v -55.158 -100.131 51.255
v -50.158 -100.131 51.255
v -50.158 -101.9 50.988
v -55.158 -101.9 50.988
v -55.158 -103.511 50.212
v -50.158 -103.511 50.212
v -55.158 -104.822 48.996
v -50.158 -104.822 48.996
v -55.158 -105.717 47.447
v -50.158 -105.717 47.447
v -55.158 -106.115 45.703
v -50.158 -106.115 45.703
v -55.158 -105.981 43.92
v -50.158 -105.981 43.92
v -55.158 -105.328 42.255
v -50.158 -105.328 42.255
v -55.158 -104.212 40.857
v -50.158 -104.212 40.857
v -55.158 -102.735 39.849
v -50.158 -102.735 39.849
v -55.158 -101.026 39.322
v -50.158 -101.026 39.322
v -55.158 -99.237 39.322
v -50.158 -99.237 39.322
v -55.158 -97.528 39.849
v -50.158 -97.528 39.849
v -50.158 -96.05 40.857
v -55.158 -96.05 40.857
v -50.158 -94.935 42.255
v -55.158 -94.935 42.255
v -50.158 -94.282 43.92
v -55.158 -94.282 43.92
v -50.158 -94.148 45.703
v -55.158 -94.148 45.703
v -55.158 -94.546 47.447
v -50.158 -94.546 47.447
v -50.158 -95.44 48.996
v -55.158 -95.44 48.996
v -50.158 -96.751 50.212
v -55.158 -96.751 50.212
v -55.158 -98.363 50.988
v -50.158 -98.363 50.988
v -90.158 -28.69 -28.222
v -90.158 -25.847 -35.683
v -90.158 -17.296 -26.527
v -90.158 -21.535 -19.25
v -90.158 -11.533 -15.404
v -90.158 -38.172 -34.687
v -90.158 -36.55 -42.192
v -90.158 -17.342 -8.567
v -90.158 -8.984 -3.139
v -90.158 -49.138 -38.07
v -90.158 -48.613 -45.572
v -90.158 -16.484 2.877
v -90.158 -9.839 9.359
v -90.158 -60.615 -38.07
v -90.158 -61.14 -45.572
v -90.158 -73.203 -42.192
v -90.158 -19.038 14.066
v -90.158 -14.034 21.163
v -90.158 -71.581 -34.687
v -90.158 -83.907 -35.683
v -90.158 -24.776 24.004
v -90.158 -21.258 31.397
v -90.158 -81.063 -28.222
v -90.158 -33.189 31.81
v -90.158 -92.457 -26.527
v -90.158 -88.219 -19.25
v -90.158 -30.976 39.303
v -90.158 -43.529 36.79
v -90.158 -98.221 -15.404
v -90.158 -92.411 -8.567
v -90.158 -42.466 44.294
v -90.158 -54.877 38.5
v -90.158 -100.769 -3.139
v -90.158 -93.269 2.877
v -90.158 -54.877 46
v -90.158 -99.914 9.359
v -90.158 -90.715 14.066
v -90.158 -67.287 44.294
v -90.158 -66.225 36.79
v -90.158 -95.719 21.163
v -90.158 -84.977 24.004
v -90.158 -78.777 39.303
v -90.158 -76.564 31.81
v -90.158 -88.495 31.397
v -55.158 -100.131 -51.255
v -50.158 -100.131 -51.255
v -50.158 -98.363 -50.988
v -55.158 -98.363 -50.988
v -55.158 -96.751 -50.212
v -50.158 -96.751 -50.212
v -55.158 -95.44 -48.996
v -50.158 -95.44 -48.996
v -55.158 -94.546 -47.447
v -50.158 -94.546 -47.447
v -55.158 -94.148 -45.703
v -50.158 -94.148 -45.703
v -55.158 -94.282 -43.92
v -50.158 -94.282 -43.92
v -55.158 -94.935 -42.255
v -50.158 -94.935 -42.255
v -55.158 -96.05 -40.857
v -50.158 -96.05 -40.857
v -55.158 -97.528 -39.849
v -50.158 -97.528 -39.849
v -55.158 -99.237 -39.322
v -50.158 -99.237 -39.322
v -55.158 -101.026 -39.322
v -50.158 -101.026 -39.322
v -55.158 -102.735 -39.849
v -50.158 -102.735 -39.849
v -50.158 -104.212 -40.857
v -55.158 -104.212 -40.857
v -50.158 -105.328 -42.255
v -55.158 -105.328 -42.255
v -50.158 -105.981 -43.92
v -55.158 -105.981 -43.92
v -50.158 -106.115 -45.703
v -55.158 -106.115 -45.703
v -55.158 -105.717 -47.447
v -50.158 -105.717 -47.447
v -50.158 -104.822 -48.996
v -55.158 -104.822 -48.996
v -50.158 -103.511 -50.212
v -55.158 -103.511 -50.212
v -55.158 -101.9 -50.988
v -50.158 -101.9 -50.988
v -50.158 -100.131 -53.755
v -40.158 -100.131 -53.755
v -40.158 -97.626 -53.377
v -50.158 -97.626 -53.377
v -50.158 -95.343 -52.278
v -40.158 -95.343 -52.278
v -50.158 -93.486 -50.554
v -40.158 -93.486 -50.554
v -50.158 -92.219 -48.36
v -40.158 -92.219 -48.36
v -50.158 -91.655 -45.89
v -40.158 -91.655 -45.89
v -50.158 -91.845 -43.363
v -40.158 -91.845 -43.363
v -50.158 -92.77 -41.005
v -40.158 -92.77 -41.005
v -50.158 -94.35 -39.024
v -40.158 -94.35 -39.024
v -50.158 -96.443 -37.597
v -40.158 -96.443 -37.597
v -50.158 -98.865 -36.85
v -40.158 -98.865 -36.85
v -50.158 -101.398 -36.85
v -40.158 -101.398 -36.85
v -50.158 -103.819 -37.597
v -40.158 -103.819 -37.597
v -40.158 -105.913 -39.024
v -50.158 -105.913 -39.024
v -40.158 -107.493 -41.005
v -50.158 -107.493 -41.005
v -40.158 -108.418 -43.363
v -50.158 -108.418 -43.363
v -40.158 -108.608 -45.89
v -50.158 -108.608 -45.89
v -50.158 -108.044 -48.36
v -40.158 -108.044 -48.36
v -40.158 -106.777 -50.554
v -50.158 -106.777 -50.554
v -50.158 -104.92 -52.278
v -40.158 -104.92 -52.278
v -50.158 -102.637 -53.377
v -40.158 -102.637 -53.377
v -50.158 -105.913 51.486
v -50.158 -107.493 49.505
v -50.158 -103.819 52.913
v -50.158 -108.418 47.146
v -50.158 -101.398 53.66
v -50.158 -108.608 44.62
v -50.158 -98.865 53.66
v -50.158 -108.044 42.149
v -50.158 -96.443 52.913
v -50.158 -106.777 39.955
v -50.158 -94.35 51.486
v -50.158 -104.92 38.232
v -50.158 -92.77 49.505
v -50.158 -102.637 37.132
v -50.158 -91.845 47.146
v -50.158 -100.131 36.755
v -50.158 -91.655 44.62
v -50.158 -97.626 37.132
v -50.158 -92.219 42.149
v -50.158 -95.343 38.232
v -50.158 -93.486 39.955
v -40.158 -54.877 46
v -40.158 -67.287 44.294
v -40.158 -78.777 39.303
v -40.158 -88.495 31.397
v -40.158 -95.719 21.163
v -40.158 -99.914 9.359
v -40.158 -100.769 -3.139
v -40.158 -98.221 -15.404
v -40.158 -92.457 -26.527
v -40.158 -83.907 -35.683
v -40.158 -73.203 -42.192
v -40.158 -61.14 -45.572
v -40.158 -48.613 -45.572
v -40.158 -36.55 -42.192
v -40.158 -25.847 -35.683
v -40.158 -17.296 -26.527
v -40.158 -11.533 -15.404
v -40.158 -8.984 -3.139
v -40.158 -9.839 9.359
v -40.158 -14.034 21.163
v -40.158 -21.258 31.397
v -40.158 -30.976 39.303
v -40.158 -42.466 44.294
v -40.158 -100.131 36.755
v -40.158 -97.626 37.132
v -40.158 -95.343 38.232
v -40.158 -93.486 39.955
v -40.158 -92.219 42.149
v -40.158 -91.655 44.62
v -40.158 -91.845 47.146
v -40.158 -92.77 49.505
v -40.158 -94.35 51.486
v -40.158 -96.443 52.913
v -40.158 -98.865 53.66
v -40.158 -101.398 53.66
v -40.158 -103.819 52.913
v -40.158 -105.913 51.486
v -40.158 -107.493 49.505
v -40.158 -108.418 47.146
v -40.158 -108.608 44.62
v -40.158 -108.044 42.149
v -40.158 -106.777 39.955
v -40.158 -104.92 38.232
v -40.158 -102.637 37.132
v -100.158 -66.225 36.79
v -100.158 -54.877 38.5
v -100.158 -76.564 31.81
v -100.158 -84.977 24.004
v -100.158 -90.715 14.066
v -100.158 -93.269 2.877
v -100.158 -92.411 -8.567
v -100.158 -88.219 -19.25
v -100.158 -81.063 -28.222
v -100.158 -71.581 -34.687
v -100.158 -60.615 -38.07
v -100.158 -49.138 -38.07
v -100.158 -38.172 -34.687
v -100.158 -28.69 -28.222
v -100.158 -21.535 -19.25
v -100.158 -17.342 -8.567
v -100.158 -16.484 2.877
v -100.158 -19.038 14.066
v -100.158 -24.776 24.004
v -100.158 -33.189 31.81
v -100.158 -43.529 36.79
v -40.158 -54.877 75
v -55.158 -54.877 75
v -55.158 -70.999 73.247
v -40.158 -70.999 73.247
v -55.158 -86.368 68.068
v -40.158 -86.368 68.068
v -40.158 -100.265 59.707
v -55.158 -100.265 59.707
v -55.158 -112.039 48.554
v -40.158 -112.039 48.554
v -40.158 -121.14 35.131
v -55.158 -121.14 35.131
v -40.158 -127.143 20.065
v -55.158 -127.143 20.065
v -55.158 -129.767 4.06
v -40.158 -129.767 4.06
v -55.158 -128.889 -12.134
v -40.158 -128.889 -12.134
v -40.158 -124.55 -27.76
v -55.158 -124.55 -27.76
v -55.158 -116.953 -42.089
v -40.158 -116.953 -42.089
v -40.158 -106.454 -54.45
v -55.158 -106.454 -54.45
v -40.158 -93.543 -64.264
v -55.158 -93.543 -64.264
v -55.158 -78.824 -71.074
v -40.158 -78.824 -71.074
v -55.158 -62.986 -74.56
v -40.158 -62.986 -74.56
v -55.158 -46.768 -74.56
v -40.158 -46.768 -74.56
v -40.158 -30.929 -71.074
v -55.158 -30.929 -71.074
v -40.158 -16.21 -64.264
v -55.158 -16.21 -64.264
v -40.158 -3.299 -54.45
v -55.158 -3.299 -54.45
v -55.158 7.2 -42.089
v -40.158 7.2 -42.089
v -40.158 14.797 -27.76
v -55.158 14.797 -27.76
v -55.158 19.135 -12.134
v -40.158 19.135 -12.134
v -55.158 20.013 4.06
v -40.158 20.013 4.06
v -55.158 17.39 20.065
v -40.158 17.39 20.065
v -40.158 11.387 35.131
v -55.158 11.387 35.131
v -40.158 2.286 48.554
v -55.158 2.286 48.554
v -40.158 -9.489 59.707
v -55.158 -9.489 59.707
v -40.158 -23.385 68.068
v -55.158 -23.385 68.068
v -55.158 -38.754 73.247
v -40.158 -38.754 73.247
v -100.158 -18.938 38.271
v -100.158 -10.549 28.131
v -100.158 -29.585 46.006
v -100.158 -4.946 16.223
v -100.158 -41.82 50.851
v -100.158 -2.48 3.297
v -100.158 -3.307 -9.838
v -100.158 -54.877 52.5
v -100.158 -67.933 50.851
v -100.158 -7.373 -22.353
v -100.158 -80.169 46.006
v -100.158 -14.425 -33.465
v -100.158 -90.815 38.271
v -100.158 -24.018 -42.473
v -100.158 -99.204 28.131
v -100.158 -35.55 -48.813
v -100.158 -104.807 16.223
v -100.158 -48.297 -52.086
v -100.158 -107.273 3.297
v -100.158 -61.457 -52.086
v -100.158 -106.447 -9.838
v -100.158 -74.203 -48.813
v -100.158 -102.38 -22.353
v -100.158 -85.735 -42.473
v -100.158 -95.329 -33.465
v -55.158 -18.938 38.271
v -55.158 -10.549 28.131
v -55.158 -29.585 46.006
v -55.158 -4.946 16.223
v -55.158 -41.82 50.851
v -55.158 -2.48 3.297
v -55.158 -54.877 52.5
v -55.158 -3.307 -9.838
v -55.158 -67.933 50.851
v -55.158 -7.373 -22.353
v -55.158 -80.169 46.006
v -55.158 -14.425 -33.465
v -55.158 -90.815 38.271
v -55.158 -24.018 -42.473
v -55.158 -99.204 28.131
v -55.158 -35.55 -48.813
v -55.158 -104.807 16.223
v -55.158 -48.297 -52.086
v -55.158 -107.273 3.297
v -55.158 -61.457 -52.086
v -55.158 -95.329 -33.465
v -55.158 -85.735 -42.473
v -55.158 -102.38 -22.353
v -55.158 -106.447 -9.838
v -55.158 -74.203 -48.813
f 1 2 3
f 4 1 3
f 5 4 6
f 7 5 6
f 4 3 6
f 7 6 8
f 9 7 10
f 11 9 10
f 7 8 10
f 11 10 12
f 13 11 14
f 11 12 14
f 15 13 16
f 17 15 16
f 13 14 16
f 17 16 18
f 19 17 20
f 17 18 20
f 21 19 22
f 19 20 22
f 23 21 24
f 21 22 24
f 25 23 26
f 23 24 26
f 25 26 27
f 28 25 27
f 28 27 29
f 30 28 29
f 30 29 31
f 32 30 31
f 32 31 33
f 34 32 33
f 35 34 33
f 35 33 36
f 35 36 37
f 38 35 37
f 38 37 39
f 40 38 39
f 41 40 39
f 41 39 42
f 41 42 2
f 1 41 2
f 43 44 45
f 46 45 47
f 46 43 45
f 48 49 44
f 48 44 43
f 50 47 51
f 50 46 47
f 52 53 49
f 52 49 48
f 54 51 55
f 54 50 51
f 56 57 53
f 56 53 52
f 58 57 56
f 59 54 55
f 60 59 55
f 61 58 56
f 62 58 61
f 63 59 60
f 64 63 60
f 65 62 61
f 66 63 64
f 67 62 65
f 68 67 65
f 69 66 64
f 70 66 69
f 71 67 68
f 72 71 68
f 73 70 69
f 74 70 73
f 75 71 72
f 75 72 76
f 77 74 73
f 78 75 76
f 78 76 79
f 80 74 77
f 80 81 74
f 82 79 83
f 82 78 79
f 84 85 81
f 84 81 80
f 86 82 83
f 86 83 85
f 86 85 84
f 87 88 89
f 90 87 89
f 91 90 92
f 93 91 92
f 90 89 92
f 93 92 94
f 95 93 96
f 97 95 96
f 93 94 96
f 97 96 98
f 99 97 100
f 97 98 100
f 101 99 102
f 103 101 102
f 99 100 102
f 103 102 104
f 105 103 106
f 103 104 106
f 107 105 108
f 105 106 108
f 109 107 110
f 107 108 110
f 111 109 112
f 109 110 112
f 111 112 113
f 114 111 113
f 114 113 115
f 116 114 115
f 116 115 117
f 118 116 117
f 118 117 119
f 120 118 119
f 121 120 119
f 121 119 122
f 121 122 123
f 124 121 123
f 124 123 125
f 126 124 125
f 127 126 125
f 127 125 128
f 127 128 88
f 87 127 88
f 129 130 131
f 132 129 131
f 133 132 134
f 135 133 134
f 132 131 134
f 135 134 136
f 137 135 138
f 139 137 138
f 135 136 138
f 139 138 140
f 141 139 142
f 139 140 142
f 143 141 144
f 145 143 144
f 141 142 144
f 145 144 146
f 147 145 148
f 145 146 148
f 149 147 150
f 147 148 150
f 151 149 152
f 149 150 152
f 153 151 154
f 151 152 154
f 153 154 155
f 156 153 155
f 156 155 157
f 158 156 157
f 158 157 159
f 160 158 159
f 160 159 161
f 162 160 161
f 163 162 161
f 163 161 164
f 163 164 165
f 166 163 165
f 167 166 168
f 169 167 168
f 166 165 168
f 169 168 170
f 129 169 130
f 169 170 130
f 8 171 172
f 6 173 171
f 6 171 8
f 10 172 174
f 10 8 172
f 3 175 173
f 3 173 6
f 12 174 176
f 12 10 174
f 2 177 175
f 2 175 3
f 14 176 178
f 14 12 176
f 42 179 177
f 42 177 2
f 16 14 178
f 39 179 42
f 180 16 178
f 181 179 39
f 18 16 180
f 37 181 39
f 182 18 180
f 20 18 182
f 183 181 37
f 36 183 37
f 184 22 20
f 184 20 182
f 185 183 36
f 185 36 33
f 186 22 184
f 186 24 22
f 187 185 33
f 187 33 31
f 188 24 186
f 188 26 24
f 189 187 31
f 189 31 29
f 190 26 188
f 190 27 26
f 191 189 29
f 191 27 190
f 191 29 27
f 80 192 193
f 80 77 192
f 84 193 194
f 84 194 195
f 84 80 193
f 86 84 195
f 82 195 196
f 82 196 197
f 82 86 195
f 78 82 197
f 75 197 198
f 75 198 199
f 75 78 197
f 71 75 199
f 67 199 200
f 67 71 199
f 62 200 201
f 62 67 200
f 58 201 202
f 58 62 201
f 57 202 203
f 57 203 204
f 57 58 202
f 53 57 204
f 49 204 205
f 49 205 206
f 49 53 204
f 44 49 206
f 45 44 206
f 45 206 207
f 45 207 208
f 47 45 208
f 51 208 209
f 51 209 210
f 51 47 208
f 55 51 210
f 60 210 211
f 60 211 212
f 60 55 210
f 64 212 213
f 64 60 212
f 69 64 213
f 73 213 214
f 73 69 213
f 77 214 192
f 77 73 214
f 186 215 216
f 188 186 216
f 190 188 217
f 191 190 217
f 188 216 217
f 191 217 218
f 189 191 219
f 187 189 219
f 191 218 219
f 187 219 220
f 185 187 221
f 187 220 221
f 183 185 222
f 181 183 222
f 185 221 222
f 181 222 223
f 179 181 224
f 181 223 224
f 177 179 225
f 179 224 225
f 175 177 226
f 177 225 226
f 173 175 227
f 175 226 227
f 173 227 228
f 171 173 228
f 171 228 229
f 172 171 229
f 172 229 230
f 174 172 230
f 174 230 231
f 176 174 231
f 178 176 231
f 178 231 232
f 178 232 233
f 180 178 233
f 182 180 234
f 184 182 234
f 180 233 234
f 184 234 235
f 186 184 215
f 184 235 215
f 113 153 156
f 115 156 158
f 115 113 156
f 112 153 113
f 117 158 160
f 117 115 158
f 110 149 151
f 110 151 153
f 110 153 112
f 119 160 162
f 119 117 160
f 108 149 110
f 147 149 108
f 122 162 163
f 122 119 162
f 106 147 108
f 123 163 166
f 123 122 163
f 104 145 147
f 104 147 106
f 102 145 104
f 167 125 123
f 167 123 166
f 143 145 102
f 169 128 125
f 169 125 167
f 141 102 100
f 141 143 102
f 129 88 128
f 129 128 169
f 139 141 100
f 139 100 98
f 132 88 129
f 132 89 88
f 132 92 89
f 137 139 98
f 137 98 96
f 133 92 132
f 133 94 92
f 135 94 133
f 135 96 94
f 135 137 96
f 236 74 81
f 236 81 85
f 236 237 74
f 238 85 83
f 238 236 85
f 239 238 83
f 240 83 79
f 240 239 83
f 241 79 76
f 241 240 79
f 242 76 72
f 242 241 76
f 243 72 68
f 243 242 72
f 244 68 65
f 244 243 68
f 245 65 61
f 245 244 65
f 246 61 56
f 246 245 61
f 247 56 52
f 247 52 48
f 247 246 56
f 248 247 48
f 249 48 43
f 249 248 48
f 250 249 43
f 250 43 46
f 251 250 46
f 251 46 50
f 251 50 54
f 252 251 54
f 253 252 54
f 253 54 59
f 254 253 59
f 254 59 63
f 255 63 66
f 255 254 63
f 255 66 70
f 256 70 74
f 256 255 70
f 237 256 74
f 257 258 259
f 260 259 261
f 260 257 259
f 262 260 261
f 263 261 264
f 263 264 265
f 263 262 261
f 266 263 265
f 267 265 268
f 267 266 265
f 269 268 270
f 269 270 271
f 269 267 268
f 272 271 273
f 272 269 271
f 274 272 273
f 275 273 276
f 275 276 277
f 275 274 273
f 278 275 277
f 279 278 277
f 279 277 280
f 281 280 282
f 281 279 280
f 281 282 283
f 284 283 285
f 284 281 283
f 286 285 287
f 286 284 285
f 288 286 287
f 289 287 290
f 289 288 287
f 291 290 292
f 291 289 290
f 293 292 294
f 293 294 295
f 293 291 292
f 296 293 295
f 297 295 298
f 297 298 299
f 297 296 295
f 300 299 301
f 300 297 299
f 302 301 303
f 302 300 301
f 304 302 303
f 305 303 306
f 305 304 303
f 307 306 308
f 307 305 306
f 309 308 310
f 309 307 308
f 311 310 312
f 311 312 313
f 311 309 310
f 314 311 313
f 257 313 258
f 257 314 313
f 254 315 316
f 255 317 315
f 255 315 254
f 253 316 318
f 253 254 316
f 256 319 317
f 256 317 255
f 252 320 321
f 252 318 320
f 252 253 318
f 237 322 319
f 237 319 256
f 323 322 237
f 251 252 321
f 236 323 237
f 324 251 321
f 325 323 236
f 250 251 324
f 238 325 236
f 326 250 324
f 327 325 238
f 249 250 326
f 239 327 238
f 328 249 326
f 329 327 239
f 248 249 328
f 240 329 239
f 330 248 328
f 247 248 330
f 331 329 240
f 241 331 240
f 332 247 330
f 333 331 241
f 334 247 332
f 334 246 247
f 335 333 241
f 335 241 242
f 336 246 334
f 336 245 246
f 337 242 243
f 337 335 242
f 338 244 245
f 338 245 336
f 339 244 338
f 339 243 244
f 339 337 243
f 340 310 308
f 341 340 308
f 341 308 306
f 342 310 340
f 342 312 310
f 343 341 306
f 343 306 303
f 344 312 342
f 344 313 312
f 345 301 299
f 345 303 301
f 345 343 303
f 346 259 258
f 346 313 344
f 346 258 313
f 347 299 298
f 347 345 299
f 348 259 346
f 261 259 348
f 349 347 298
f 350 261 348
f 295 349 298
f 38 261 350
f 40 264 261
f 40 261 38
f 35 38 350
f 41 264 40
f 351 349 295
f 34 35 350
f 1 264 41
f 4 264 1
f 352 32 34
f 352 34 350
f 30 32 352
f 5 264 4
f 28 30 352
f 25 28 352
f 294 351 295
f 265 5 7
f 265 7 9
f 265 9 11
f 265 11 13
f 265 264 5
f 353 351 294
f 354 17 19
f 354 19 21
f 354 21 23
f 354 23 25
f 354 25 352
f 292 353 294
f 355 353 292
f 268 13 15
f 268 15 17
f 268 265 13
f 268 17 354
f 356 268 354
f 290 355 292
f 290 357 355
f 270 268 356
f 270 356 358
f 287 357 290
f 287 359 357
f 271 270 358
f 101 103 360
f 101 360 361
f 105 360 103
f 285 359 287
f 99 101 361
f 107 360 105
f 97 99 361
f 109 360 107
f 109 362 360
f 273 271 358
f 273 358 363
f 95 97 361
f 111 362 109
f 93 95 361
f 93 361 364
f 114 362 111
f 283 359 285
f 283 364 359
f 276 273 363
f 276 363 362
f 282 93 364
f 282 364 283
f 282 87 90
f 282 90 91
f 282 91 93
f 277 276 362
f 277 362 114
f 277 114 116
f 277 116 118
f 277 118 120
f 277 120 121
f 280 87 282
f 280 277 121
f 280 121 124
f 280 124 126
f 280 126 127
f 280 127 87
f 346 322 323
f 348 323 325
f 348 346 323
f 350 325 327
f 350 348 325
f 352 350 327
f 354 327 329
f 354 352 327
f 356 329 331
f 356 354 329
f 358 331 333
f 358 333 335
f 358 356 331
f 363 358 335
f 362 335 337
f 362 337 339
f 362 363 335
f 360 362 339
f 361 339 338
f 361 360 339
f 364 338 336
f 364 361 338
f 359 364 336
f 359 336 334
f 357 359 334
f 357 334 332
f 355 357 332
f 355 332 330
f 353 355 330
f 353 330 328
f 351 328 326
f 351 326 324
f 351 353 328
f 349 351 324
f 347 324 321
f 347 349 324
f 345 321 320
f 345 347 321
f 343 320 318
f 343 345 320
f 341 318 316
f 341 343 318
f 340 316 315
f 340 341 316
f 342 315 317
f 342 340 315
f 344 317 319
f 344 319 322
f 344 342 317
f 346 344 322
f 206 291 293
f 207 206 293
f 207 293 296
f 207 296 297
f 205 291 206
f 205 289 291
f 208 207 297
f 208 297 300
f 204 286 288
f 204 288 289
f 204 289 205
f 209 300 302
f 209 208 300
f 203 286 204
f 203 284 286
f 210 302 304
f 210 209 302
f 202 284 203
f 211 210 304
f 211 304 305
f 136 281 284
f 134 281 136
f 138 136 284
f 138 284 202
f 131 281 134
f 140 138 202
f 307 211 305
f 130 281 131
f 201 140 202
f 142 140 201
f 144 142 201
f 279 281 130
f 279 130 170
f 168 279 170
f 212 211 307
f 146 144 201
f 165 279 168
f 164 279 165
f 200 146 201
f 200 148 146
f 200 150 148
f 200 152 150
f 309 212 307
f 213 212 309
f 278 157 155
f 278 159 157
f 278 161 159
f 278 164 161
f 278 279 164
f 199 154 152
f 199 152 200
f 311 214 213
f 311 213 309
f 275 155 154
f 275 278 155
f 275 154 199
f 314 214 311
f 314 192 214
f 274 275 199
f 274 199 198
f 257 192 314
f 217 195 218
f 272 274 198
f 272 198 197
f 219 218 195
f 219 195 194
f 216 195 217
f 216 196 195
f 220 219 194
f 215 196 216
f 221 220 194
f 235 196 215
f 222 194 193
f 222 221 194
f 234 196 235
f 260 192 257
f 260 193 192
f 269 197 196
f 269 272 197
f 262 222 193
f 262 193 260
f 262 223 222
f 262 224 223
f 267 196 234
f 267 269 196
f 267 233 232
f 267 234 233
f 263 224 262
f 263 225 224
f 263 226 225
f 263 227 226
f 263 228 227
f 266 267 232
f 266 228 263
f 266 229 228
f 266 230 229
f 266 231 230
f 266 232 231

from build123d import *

# Parameters (mm, degrees)
SKETCH3_R          = 6
CUT_EXTRUDE2_DEPTH = 16
SKETCH4_R          = 8.5
CUT_EXTRUDE3_DEPTH = 10


with BuildPart() as part:
    # Sketch1 → Revolve1 (revolve)
    with BuildSketch(Plane.XY, mode=Mode.PRIVATE) as revolve1_sk:
        Polygon((-90.158227848, -16.376582278), (-100.158227848, -16.376582278), (-100.158227848, -2.376582278), (-55.158227848, -2.376582278), (-55.158227848, 20.123417722), (-40.158227848, 20.123417722), (-40.158227848, -8.876582278), (-90.158227848, -8.876582278), align=None)
    revolve(revolve1_sk.sketch.rotate(Axis((-100.158227848, -54.876582278, 0), (1, 0, 0)), 90), axis=Axis((-100.158227848, -54.876582278, 0), (1, 0, 0)))

    # Sketch3 → Cut-Extrude2 (cut)
    with BuildSketch(Plane(origin=(-40.158227848, 0, 0), x_dir=(0, 0, -1), z_dir=(1, 0, 0))):
        with Locations((45.254833996, -100.131416274)):
            Circle(SKETCH3_R)
        with Locations(Location((-45.254833996, -100.131416274, 0), (0, 0, 180))):
            Circle(SKETCH3_R)
    extrude(amount=-CUT_EXTRUDE2_DEPTH, mode=Mode.SUBTRACT)

    # Sketch4 → Cut-Extrude3 (cut)
    with BuildSketch(Plane(origin=(-40.158227848, 0, 0), x_dir=(0, 0, -1), z_dir=(1, 0, 0))):
        with Locations((-45.254833996, -100.131416274)):
            Circle(SKETCH4_R)
        with Locations((45.254833996, -100.131416274)):
            Circle(SKETCH4_R)
    extrude(amount=-CUT_EXTRUDE3_DEPTH, mode=Mode.SUBTRACT)


solid = part.part
